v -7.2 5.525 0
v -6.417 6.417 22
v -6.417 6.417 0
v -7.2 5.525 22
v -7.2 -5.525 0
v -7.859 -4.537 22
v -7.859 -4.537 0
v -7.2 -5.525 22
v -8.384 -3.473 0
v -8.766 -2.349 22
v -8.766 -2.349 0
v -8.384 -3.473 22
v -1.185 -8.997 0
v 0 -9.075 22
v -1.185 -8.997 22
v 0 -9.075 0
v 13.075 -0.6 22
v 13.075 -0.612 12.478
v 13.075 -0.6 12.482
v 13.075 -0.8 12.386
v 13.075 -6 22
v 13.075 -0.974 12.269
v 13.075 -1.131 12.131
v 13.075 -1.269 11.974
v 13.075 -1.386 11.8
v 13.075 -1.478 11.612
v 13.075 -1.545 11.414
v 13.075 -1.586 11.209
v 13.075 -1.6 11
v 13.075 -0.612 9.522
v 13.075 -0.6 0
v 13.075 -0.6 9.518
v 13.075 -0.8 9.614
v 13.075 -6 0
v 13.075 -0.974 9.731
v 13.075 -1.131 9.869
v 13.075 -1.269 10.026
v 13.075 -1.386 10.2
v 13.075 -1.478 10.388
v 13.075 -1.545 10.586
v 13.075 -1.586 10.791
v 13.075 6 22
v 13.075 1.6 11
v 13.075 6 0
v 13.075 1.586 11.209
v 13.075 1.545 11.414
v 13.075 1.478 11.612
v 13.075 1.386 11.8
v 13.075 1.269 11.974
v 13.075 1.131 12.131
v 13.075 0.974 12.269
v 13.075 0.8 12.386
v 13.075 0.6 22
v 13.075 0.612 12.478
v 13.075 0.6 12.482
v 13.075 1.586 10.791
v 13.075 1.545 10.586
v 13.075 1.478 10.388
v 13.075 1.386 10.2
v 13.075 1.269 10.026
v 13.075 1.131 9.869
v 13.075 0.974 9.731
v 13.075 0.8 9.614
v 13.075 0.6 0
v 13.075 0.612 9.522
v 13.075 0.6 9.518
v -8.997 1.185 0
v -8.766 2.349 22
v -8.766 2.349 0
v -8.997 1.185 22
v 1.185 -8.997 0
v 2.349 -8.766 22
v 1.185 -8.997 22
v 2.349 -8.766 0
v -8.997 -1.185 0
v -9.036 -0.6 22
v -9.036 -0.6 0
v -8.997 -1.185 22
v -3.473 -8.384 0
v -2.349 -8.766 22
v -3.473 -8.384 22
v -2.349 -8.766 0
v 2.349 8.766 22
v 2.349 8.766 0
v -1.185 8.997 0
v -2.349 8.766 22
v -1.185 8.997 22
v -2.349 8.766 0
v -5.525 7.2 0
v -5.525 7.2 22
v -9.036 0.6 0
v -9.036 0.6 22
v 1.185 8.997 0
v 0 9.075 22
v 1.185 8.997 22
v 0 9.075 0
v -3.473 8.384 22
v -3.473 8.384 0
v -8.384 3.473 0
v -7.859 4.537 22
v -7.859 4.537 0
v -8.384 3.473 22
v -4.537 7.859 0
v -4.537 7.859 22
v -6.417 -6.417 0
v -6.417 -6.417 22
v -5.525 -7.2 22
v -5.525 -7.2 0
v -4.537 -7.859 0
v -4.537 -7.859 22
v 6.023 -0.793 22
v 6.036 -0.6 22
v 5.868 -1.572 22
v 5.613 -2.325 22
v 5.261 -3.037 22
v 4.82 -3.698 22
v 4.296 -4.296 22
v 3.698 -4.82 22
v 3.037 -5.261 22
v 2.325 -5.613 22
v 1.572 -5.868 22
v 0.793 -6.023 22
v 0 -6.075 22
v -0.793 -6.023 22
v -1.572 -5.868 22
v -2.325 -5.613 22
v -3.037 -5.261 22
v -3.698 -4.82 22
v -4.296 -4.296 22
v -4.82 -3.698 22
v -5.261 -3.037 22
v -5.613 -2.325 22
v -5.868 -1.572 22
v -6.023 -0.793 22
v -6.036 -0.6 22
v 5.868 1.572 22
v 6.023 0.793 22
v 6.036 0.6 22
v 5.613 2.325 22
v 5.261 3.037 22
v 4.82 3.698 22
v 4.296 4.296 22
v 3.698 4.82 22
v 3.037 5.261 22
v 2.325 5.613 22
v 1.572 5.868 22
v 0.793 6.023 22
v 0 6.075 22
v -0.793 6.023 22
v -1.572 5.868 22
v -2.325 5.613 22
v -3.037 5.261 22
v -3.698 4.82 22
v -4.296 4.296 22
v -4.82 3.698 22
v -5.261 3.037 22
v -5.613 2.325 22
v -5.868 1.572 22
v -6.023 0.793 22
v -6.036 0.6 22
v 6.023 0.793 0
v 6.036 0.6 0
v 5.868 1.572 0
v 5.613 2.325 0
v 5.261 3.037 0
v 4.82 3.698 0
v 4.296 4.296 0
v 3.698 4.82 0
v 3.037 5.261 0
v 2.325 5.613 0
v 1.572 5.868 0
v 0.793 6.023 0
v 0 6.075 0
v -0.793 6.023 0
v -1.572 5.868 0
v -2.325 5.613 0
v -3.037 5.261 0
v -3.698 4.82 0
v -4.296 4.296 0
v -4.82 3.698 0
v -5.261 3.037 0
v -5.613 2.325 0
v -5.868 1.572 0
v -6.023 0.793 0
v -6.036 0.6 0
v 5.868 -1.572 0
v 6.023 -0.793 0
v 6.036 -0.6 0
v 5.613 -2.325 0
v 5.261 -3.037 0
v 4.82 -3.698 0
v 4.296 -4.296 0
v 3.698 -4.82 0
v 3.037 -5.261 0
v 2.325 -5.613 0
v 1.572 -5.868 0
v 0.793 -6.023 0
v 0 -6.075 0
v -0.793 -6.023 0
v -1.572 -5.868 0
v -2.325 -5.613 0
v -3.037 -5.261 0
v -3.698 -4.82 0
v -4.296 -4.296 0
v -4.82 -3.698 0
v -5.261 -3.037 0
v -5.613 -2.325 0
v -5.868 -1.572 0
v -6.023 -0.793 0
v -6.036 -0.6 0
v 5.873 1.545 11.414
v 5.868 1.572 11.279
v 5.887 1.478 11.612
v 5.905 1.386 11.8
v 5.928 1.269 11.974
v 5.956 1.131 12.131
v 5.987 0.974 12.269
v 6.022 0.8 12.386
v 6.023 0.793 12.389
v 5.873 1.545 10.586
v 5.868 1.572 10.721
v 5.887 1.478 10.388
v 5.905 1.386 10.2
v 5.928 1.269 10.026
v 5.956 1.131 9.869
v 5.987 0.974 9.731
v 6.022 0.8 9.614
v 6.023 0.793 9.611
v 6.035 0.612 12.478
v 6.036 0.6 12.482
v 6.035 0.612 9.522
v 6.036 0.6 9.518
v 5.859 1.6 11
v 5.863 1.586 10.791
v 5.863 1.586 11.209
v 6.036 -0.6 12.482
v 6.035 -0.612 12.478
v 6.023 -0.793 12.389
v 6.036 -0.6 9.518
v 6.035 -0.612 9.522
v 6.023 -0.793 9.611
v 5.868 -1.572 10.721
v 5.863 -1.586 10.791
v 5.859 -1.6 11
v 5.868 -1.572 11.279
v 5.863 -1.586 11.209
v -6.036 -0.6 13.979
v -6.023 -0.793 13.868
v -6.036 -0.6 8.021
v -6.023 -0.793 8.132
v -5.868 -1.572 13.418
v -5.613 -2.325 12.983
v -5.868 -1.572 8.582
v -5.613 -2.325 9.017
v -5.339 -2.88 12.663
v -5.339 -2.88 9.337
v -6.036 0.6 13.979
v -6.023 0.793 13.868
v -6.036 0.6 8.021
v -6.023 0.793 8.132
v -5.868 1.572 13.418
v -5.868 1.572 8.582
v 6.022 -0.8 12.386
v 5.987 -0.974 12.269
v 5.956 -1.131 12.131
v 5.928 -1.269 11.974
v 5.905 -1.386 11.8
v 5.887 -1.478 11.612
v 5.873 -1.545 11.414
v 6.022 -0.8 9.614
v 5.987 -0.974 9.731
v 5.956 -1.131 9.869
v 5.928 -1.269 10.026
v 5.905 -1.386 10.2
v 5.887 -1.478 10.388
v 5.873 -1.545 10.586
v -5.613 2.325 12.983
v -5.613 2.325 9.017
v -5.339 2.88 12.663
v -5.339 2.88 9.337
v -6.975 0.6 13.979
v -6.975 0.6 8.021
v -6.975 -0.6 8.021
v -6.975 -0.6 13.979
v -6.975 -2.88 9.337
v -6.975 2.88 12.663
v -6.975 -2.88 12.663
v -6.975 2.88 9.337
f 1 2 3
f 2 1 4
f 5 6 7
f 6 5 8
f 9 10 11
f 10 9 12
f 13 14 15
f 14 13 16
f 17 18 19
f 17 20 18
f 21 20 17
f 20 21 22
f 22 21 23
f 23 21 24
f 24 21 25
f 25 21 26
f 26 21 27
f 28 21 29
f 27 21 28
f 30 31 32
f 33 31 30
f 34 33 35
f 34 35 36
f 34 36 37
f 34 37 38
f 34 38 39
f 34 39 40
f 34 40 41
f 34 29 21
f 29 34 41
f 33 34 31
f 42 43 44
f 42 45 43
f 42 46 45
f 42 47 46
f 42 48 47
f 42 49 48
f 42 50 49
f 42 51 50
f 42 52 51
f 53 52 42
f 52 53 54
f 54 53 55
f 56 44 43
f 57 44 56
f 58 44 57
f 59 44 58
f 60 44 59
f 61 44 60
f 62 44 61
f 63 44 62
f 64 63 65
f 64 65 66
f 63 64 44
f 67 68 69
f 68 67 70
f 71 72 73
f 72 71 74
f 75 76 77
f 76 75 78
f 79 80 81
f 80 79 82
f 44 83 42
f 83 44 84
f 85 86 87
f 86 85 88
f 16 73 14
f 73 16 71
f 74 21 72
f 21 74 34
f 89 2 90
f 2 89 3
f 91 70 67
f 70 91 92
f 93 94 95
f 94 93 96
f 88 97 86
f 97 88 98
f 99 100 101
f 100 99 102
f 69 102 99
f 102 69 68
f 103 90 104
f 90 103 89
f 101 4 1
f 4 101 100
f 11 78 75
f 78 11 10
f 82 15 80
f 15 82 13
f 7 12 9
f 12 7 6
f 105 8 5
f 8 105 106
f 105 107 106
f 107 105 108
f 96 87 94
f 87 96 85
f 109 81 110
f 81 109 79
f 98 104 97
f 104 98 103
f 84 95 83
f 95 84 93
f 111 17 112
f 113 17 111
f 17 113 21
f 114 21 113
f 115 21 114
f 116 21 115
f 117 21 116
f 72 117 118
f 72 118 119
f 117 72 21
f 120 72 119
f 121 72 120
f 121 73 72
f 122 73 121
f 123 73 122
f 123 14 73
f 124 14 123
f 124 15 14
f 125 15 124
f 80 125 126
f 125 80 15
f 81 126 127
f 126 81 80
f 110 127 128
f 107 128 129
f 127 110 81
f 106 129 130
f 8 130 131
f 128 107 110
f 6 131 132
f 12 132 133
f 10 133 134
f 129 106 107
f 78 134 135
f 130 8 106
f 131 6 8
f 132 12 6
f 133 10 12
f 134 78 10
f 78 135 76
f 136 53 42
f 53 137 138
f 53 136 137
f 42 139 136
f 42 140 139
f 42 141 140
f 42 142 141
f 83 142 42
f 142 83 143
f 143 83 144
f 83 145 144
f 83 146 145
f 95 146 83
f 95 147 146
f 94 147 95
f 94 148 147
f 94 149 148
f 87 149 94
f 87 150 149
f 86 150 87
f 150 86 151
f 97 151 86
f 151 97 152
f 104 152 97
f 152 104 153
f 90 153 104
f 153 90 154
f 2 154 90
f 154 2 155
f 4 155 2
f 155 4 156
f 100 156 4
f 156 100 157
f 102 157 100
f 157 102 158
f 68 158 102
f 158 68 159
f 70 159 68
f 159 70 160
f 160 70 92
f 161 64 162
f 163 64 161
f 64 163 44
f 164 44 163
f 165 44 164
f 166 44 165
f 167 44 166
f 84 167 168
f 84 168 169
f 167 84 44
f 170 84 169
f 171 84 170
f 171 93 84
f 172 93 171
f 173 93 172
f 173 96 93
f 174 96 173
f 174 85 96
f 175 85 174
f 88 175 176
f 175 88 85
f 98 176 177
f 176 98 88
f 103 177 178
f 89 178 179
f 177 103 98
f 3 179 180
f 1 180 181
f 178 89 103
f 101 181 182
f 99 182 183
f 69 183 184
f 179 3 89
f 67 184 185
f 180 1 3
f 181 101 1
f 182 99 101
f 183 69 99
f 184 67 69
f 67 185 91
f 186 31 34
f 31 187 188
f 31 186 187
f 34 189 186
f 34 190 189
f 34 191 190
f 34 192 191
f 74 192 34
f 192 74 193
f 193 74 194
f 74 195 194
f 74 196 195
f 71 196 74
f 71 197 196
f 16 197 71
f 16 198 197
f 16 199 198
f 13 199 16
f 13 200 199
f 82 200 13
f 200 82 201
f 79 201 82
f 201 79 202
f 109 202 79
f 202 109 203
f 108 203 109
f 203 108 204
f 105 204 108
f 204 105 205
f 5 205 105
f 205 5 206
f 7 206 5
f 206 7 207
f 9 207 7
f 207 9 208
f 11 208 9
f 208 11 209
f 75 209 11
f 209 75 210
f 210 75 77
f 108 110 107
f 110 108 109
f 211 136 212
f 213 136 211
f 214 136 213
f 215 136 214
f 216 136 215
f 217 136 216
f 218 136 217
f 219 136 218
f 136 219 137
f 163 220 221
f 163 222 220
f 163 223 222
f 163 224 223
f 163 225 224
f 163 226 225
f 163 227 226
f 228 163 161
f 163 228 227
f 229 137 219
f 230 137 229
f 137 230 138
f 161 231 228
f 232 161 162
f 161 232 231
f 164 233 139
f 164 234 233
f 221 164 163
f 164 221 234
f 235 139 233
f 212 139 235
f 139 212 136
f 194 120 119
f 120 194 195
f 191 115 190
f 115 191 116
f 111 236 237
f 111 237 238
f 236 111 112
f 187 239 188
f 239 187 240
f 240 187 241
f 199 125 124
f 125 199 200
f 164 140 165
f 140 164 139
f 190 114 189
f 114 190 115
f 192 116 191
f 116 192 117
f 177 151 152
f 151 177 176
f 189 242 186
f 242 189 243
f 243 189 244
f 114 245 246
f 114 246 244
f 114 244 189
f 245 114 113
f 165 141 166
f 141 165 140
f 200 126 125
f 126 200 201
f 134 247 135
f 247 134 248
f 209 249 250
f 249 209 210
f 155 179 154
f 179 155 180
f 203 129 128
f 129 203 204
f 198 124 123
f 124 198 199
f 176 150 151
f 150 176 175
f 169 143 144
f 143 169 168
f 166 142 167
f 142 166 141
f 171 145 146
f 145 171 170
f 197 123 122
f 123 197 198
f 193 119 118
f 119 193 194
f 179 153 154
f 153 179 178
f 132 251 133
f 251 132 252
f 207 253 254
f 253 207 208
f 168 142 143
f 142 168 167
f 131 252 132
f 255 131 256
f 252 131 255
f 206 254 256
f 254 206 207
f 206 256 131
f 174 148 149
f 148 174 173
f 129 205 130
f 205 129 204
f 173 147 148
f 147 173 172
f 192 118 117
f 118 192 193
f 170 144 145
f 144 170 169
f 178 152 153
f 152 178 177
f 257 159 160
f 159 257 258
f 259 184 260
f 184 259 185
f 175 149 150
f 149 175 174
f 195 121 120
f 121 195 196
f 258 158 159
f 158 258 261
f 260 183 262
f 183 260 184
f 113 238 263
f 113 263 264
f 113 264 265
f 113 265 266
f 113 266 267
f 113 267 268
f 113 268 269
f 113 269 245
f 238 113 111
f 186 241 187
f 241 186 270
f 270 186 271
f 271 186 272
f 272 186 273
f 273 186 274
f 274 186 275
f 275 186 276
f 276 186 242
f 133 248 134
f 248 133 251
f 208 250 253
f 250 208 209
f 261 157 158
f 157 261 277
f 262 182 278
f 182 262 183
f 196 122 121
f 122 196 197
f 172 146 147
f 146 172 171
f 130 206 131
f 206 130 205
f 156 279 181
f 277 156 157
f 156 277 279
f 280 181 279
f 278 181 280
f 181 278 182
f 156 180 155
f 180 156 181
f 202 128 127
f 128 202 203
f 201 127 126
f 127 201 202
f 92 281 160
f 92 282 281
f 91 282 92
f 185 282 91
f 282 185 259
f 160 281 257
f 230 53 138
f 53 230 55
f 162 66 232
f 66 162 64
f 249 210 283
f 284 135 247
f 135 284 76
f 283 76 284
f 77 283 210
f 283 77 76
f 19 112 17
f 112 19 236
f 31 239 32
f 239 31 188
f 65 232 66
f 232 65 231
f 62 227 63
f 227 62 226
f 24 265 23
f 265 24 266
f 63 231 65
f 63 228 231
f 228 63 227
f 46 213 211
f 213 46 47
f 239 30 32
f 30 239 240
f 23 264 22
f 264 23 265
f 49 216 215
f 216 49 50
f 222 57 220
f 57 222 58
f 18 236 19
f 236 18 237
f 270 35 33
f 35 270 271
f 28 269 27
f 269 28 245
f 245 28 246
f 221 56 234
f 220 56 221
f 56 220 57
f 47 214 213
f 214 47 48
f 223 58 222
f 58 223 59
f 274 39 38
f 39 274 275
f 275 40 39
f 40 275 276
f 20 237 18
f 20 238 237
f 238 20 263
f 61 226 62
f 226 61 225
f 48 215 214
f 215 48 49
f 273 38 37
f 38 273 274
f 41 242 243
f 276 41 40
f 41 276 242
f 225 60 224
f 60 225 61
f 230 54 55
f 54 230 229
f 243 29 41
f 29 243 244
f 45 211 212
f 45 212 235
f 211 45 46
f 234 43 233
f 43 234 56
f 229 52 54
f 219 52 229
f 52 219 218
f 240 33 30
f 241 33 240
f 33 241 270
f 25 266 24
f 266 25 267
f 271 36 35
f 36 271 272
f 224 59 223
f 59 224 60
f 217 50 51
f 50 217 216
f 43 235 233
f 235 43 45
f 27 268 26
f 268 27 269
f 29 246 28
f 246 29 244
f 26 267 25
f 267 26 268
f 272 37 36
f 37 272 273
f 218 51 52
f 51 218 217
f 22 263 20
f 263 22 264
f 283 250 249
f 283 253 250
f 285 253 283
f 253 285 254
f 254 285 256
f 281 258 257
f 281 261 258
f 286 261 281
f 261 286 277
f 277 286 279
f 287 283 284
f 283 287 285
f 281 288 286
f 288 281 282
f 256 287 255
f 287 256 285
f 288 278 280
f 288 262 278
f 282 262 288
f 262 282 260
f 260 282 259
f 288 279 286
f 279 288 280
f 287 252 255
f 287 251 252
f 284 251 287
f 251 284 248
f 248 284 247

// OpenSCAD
// ORIGINAL TechHand/PRINT trainer CAD v0 — training tool only
// Clamp / set-screw retainer for cylindrical bought laser diode module.
// Fixed laser ≤5 mW class — pocket for purchased module (not a firearm barrel).
// diametral clearance 0.15 mm over module_d. Set-screw M3 from side.

/* ===== PARAMETERS ===== */
module_d = 12;             // typical diode housing OD (mm); adjustable
clear_d = 0.15;            // diametral clearance
clamp_len = 22;            // clamp length along module axis
clamp_wall = 3.0;          // radial wall thickness
slot_w = 1.2;              // split slot for clamp flex
set_screw_d = 3.2;         // M3 clearance / tap pilot
nut_trap = true;           // include M3 hex nut trap opposite set-screw
nut_af = 5.5;              // M3 nut across-flats
nut_h = 2.4;
$fn = 48;

id = module_d + clear_d;
od = id + 2 * clamp_wall;

module laser_clamp() {
    difference() {
        // Outer body — short cylindrical MODULE BAY clamp (trainer labeling in README)
        hull() {
            cylinder(h=clamp_len, d=od);
            // Flat pad for set-screw boss
            translate([od/2 - 1, -6, 0])
                cube([5, 12, clamp_len]);
        }
        // Module bore
        translate([0, 0, -0.1])
            cylinder(h=clamp_len + 0.2, d=id);
        // Split slot
        translate([-od/2 - 1, -slot_w/2, -0.1])
            cube([od + 8, slot_w, clamp_len + 0.2]);
        // Set-screw hole
        translate([0, 0, clamp_len/2])
            rotate([0, 90, 0])
                cylinder(h=od, d=set_screw_d);
        if (nut_trap) {
            // Hex nut trap on opposite side of boss
            translate([-(id/2 + clamp_wall*0.3), 0, clamp_len/2])
                rotate([0, 90, 0])
                    cylinder(h=nut_h + 0.5, d=nut_af / cos(30) + 0.3, $fn=6);
        }
    }
}

laser_clamp();
